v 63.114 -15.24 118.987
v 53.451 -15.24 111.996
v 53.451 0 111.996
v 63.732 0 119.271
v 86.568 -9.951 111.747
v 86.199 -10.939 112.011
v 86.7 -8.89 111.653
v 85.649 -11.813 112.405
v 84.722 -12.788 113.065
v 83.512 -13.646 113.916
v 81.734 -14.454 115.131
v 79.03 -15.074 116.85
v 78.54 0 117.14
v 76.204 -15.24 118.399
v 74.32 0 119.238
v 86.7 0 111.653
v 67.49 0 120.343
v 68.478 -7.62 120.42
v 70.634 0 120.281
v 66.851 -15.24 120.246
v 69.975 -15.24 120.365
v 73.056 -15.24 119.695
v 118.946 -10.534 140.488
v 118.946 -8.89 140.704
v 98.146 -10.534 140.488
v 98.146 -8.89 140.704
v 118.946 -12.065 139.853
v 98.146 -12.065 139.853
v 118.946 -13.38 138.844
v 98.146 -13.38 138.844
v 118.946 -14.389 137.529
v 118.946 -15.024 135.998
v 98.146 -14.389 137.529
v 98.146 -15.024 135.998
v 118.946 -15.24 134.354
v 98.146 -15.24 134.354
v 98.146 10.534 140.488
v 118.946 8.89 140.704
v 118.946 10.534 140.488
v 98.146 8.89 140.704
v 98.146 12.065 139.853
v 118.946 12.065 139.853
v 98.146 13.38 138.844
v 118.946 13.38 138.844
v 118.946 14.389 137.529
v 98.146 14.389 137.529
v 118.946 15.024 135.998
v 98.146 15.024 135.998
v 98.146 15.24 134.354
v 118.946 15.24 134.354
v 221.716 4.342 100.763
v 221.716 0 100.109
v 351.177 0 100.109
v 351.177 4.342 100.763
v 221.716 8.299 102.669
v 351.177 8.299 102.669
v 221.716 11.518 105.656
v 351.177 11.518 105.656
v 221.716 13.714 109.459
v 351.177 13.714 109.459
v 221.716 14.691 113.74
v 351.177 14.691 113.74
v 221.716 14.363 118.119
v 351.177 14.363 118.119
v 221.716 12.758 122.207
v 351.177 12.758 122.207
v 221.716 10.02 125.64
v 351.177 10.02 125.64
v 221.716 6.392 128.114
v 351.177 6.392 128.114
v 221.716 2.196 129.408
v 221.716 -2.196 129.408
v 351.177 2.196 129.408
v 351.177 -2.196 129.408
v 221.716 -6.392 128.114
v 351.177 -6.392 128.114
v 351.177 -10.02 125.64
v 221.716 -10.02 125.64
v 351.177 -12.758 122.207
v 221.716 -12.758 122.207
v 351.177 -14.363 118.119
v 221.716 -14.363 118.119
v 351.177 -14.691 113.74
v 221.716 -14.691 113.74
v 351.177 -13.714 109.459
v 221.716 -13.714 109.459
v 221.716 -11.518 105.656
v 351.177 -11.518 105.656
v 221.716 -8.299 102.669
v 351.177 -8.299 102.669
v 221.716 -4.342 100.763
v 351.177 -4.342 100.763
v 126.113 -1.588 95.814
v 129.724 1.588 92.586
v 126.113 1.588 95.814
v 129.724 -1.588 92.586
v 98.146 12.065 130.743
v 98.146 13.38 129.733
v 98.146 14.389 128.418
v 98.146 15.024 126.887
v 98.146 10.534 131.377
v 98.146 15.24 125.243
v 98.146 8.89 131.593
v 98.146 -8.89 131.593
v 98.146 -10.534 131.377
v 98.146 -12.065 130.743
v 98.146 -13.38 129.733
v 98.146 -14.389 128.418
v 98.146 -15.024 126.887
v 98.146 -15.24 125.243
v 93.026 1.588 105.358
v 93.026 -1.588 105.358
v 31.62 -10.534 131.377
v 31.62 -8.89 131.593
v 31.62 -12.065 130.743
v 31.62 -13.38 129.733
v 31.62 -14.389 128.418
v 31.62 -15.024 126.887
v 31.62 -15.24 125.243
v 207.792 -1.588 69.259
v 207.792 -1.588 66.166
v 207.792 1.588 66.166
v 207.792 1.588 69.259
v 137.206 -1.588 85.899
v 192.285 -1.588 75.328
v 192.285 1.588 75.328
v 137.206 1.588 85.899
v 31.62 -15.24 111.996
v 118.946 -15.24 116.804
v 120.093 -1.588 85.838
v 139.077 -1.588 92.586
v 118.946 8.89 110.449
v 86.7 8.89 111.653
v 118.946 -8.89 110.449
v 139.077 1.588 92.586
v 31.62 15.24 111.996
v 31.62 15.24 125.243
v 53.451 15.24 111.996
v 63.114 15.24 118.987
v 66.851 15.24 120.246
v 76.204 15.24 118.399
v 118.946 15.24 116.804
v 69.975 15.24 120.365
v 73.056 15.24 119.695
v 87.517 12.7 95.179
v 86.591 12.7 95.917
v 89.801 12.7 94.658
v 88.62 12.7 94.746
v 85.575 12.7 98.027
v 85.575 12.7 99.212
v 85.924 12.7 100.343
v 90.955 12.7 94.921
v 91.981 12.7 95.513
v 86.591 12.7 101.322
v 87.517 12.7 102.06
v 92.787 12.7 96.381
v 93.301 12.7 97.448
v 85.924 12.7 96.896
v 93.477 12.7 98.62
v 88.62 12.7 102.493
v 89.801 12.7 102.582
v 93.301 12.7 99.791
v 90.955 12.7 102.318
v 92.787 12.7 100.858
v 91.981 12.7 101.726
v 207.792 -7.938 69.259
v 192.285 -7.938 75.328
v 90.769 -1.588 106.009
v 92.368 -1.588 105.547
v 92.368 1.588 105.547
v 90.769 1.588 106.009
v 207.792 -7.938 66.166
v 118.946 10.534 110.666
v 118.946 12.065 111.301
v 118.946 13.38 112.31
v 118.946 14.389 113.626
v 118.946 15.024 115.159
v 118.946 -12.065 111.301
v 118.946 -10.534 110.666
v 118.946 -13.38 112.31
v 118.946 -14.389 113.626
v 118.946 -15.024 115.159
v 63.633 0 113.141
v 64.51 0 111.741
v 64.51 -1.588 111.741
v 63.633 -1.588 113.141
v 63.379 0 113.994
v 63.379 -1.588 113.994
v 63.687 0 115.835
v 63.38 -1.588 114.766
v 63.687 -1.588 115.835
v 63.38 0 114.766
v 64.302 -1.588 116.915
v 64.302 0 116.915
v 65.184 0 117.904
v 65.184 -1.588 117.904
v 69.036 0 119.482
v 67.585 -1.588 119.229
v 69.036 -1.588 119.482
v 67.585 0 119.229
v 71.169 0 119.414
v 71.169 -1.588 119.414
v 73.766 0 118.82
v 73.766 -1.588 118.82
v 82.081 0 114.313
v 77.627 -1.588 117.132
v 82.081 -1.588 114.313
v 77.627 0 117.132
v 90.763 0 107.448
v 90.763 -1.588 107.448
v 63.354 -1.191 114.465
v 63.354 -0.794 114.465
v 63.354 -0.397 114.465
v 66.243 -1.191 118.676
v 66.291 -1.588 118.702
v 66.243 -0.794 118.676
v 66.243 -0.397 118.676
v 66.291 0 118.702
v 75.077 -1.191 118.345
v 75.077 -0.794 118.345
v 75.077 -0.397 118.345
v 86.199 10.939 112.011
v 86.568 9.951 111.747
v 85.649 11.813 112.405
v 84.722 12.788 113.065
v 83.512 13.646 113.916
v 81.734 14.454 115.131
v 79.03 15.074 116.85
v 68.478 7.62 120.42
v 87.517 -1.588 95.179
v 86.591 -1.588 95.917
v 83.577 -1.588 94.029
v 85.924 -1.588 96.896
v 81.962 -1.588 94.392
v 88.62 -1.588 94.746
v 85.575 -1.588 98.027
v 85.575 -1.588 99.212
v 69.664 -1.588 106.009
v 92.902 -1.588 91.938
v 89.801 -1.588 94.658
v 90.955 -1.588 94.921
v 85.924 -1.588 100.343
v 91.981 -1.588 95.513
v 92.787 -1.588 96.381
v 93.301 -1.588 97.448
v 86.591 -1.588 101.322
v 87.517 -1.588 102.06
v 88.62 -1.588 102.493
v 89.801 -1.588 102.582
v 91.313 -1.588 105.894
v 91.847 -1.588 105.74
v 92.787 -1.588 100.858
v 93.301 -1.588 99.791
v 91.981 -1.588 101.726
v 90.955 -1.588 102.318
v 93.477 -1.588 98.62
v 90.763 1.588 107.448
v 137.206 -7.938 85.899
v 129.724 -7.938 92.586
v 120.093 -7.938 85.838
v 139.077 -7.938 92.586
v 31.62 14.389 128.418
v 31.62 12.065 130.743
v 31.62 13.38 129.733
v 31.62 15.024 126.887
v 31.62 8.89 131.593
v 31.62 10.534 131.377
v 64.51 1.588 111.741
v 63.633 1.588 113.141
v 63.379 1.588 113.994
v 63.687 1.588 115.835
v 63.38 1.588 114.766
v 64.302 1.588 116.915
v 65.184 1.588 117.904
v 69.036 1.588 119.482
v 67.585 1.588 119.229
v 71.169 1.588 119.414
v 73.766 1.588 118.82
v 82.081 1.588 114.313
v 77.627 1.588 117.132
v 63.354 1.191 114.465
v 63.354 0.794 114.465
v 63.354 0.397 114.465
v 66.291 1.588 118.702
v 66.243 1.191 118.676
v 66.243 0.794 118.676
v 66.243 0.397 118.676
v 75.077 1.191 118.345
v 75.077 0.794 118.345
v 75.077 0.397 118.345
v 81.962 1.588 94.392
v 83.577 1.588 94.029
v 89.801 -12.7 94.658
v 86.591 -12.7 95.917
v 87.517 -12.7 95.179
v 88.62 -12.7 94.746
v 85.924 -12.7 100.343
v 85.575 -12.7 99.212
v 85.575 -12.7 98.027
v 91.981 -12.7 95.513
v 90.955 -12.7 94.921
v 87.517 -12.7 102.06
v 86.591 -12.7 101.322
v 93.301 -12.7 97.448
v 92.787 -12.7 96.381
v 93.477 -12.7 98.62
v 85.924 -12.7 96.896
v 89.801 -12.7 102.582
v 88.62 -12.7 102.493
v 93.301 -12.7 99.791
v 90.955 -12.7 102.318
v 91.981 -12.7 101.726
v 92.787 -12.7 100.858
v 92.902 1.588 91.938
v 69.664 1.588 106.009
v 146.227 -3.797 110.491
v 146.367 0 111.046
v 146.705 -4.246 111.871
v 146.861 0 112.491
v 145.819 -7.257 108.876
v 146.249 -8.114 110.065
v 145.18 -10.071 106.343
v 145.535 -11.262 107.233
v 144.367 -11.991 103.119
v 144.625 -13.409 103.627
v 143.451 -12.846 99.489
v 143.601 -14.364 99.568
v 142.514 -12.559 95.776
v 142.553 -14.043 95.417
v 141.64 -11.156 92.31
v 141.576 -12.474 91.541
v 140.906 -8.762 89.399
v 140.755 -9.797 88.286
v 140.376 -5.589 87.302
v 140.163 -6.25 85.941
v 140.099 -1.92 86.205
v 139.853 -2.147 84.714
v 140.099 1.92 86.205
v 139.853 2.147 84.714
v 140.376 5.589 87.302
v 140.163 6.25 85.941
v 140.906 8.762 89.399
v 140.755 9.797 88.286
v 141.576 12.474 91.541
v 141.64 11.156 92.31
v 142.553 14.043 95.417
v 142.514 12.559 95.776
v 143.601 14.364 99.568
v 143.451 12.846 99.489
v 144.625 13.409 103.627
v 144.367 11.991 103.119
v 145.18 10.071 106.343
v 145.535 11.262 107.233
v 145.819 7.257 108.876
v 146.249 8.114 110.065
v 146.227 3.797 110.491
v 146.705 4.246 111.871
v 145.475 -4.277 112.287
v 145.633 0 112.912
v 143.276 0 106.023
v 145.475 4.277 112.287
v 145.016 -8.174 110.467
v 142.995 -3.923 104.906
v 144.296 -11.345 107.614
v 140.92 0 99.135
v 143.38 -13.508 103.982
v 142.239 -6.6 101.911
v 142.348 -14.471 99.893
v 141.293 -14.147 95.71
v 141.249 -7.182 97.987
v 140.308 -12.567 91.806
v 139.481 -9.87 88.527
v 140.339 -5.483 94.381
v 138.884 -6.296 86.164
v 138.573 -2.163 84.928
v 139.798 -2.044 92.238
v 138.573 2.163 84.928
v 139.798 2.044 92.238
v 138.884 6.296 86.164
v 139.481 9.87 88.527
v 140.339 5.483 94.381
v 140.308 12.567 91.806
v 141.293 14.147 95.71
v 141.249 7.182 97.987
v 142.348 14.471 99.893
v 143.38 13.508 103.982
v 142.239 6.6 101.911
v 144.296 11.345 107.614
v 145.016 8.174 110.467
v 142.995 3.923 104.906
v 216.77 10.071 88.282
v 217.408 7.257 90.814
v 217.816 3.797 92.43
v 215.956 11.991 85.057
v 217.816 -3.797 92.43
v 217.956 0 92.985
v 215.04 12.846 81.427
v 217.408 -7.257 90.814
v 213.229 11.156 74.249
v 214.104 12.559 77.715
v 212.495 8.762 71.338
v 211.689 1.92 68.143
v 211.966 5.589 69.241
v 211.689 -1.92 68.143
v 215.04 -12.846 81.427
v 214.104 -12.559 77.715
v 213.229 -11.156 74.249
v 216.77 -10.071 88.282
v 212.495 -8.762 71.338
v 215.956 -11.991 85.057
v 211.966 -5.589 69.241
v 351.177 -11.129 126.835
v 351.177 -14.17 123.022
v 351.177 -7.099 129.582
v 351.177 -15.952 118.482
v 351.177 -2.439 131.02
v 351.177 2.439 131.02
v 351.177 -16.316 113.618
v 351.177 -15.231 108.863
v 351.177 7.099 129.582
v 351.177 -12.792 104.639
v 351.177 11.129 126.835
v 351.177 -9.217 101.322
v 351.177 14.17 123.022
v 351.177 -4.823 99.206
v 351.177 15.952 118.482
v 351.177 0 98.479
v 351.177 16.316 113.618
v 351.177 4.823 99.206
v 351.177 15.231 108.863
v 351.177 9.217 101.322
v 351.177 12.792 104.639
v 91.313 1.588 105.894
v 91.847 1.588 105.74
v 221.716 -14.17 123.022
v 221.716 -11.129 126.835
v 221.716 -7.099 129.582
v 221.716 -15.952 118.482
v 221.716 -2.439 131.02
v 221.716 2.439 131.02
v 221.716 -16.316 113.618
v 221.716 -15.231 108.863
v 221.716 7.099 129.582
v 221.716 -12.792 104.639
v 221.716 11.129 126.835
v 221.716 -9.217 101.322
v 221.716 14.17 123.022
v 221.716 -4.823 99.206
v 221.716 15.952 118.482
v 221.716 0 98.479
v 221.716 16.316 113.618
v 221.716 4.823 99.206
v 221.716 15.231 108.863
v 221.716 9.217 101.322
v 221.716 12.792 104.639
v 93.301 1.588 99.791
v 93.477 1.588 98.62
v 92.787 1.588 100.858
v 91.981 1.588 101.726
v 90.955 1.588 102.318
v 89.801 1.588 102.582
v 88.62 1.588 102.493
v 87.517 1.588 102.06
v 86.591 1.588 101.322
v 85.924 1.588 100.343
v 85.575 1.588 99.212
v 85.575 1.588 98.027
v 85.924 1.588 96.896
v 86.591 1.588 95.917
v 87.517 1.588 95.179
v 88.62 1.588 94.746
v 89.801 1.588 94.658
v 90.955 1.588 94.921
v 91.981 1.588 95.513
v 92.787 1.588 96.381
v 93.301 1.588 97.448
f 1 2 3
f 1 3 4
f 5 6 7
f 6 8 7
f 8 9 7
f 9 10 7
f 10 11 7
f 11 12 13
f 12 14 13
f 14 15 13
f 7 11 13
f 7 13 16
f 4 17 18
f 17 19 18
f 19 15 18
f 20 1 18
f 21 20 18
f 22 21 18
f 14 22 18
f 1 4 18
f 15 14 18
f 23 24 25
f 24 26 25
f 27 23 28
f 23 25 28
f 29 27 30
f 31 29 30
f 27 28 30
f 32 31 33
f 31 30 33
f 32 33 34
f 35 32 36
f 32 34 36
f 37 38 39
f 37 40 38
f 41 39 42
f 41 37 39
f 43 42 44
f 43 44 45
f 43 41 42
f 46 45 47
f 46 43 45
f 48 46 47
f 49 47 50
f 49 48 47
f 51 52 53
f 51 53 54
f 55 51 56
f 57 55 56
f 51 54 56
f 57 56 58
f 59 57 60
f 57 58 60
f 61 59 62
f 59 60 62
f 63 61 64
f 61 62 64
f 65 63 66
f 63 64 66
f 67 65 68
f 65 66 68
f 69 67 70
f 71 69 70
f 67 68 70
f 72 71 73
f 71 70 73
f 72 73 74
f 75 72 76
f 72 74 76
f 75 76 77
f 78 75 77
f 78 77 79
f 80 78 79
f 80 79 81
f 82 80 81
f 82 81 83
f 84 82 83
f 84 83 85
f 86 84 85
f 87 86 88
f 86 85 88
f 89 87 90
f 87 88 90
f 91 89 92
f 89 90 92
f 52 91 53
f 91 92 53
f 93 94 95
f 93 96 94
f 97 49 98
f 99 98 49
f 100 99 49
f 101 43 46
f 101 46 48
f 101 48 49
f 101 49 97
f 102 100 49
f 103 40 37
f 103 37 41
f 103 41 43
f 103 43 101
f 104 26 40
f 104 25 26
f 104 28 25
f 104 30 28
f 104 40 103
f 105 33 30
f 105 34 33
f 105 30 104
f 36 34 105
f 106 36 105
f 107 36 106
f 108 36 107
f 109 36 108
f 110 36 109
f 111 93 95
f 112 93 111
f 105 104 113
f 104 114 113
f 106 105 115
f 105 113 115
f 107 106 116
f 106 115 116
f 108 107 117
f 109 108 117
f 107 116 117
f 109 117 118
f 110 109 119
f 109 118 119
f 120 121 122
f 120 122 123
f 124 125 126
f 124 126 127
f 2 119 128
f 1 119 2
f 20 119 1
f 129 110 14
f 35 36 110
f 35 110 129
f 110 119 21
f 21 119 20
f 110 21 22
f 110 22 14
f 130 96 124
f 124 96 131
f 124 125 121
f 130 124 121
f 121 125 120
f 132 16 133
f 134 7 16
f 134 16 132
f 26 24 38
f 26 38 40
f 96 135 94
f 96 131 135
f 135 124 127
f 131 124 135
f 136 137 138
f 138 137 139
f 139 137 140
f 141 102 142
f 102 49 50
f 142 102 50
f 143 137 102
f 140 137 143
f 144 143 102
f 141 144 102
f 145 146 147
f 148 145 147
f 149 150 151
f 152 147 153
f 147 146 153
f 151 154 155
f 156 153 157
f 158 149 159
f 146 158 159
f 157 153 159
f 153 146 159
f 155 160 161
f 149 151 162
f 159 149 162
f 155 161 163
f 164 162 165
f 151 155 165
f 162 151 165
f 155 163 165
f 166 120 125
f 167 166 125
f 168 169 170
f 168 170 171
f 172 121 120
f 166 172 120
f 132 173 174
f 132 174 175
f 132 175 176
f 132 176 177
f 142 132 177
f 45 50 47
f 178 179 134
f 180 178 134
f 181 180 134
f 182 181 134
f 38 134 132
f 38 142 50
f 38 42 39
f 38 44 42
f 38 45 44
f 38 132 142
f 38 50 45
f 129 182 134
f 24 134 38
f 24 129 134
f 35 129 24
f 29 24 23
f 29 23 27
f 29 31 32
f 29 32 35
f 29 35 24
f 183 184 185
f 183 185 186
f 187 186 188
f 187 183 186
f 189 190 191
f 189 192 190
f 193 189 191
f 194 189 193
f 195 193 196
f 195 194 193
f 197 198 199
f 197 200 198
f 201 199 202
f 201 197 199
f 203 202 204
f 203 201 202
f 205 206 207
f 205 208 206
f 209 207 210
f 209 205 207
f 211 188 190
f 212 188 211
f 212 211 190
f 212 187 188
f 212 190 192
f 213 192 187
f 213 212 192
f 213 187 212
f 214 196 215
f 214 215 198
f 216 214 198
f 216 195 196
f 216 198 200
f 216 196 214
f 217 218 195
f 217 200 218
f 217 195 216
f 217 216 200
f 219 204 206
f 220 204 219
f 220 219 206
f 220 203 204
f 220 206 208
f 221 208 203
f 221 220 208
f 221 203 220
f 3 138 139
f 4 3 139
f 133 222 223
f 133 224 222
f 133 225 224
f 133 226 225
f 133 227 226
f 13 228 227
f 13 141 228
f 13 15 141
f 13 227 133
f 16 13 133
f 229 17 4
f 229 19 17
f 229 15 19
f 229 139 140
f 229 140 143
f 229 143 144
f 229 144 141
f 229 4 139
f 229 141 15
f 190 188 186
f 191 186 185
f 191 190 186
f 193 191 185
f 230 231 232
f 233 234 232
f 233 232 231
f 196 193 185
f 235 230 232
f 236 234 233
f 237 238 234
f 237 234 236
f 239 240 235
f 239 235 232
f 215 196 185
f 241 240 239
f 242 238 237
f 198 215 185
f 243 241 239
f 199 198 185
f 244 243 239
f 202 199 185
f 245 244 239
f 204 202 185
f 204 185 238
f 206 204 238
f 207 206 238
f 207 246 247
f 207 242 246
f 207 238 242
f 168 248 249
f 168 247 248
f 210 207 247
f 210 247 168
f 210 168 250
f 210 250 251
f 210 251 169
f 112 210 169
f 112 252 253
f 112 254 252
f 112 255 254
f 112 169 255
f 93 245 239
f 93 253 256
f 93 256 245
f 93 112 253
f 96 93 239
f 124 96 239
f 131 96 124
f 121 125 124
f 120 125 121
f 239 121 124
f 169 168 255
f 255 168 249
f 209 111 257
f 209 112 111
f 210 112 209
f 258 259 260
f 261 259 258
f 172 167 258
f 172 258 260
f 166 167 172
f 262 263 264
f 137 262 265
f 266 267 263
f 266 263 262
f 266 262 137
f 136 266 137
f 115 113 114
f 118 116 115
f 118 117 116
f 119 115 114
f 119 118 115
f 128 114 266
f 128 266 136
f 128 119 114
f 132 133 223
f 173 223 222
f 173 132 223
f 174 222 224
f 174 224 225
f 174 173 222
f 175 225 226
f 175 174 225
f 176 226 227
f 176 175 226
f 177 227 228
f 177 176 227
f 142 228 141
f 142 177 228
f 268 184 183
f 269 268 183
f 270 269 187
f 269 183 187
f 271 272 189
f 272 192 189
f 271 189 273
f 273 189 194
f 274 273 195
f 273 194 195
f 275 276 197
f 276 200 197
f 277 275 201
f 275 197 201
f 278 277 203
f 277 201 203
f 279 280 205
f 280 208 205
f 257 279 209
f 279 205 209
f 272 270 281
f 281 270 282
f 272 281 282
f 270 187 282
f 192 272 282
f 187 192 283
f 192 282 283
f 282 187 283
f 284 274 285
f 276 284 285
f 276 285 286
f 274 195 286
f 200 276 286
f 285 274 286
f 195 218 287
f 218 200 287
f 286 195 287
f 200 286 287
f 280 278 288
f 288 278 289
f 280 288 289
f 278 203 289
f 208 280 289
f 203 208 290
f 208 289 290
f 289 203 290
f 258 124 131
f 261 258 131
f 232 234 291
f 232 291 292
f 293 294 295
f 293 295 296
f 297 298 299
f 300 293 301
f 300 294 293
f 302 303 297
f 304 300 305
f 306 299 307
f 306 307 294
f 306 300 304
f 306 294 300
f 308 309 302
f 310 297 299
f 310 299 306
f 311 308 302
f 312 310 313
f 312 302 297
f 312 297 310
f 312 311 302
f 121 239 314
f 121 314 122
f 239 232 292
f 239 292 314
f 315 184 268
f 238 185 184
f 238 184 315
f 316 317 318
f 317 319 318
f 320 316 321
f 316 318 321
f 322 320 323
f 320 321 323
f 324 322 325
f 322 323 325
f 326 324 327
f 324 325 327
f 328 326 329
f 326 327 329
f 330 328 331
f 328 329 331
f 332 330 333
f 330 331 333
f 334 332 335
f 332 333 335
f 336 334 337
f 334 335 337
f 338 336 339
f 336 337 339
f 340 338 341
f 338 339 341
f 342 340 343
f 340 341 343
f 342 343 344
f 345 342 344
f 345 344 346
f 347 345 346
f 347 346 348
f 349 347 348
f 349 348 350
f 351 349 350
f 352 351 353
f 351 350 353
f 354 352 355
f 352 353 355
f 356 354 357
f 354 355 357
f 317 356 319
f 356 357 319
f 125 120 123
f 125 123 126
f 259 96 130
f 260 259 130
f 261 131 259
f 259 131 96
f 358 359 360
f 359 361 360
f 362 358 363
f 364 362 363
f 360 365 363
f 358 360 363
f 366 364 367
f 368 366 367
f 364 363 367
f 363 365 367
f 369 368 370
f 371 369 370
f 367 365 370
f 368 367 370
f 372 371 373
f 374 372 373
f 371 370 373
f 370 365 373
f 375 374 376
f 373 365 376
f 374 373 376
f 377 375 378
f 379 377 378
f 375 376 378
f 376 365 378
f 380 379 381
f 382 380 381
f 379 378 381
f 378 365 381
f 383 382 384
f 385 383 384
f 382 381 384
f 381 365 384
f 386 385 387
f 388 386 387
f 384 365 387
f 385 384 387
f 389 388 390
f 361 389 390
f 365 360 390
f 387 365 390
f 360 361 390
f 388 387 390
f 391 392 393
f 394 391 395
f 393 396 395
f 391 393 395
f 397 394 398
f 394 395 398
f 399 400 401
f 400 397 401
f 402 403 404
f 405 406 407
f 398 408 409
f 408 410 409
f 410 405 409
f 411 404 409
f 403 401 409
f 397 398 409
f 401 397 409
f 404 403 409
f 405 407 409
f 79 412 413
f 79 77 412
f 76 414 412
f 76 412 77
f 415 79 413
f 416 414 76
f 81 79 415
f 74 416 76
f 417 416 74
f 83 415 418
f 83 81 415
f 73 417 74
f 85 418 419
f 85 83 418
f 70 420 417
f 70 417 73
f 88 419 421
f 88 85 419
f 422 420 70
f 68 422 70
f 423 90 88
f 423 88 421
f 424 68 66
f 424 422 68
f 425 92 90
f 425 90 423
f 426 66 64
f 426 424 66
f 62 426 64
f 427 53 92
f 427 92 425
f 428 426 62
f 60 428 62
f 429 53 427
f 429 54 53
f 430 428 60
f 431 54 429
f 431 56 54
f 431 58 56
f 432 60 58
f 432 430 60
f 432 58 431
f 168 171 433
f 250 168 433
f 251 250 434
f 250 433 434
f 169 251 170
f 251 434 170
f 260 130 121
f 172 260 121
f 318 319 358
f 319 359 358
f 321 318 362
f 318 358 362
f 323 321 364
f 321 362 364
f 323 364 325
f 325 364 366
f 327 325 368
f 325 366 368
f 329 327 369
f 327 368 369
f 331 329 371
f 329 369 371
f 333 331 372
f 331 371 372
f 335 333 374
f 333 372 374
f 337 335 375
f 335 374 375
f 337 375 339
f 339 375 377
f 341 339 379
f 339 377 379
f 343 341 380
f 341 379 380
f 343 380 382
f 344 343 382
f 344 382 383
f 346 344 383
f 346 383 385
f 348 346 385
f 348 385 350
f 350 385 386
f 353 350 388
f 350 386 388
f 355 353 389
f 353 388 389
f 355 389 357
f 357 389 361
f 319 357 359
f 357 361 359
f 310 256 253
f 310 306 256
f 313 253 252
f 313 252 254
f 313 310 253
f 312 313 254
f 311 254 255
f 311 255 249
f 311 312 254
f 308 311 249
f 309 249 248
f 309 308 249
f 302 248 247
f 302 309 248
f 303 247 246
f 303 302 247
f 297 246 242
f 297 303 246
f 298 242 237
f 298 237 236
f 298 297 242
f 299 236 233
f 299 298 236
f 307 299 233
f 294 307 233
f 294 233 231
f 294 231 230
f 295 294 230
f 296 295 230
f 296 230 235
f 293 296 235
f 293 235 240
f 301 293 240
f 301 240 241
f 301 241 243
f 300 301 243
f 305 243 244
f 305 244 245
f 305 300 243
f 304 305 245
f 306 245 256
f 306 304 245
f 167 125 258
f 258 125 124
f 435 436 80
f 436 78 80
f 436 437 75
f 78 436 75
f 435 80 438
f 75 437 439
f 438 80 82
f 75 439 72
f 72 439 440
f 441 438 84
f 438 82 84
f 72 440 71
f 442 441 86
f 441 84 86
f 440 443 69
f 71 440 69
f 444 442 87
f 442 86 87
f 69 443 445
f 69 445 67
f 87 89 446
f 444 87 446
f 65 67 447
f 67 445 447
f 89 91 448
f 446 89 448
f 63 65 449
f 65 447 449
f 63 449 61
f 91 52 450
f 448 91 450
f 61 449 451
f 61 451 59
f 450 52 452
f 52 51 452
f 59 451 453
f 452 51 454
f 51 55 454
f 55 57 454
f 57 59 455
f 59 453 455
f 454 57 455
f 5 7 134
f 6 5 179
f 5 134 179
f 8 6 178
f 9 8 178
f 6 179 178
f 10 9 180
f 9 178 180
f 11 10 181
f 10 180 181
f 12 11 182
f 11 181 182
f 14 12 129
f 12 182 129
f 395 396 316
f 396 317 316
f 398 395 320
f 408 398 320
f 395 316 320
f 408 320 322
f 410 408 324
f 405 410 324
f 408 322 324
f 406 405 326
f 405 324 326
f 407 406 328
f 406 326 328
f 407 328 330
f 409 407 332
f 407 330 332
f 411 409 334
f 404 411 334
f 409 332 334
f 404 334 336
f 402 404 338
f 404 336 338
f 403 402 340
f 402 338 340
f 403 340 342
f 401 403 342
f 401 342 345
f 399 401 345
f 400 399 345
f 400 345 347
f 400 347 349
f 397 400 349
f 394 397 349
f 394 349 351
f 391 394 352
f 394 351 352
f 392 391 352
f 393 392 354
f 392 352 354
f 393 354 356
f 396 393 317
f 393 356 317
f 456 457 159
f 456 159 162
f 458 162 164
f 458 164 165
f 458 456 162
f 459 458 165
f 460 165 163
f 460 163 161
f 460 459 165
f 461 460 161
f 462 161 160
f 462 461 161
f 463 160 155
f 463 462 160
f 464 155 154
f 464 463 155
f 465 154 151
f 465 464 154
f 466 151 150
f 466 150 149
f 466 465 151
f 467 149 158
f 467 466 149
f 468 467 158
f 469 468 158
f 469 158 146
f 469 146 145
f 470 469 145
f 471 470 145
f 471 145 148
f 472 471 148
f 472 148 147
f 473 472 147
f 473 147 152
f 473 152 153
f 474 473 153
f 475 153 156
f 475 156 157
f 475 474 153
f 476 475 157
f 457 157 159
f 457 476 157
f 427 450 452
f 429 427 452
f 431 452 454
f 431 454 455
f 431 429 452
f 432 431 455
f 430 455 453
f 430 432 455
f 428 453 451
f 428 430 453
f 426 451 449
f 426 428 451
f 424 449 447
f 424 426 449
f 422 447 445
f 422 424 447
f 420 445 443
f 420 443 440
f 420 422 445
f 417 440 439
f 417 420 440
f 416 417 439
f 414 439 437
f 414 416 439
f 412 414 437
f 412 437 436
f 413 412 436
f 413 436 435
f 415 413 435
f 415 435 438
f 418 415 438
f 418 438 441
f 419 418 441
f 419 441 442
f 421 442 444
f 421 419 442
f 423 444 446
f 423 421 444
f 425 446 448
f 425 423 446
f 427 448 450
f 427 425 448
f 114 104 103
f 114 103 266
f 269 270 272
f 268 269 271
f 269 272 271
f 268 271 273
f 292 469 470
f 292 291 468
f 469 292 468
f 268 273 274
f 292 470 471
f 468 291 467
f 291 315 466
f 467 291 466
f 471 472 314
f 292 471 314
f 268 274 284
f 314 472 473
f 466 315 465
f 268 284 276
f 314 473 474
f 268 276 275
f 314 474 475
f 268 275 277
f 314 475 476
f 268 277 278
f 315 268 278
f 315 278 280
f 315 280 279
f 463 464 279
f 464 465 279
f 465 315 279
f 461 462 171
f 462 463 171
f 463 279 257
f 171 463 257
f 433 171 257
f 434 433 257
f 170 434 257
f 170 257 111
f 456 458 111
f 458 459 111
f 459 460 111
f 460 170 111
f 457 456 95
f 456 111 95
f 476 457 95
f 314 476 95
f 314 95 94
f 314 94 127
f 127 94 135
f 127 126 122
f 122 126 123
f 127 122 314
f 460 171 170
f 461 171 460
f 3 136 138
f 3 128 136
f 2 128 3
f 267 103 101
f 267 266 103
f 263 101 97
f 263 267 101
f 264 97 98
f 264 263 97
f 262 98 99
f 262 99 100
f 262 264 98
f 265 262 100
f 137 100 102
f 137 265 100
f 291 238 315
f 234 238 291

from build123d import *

# Parameters (mm, degrees)
F1_DEPTH = 15.24
F0_R     = 3.9731060398
F0_R_2   = 3.0736063734
F2_DEPTH = 1.5875
F3_DEPTH = 12.7
F4_DEPTH = 1.5875
F5_R     = 6.35
F7_DEPTH = 6.35
F0_W     = 129.4614523649
F0_H     = 1.6299113631


with BuildPart() as f1:
    # F0 (on Front) → F1 (new body, symmetric)
    with BuildSketch(Plane.XZ):
        with BuildLine():
            Line((86.6997018456, 111.6525381804), (118.946261704, 110.4492247105))
            Line((118.946261704, 110.4492247105), (118.946261704, 140.7041400671))
            Line((118.946261704, 140.7041400671), (98.146006465, 140.7041400671))
            Line((98.146006465, 140.7041400671), (98.146006465, 131.5932869911))
            Line((98.146006465, 131.5932869911), (61.9845092297, 131.5932869911))
            Line((61.9845092297, 131.5932869911), (31.6195674241, 131.5932869911))
            Line((31.6195674241, 131.5932869911), (31.6195674241, 111.996345222))
            Line((31.6195674241, 111.996345222), (53.4512475133, 111.996345222))
            add(Edge.make_bspline(
                [(53.4512475133, 111.996345222), (58.3168306673, 116.1252412176), (68.453958846, 124.7275292928), (80.4575514371, 116.1256945279), (86.6997018456, 111.6525381804)],
                knots=[0, 0, 0, 0, 0.4799764853, 1, 1, 1, 1], degree=3))
        make_face()
    extrude(amount=F1_DEPTH, both=True)

    # F5
    f5_edges = [f1.edges().sort_by_distance(p)[0] for p in [
        (108.546134, -15.24, 140.70414),
        (108.546134, 15.24, 140.70414),
        (64.882787, -15.24, 131.593287),
        (64.882787, 15.24, 131.593287),
        (102.822982, -15.24, 111.050881),
        (102.822982, 15.24, 111.050881),
    ]]
    fillet(f5_edges, radius=F5_R)


with BuildPart() as f2:
    # F0 (on Front) → F2 (new body, symmetric)
    with BuildSketch(Plane.XZ):
        with BuildLine():
            Line((93.0258051353, 105.357555367), (92.3684626431, 105.5471538964))
            ThreePointArc((92.3684626431, 105.5471538964), (96.9946369471, 98.9133964686), (92.9022758123, 91.9376666398))
            Line((92.9022758123, 91.9376666398), (207.791640524, 66.1663692981))
            Line((207.791640524, 66.1663692981), (207.791640524, 69.2587812037))
            Line((207.791640524, 69.2587812037), (192.2845032771, 75.3275844649))
            Line((192.2845032771, 75.3275844649), (137.2056572242, 85.8992456725))
            Line((137.2056572242, 85.8992456725), (139.0773238139, 92.5864348974))
            Line((139.0773238139, 92.5864348974), (129.7239542488, 92.5864348974))
            Line((129.7239542488, 92.5864348974), (126.1126250029, 95.8142617838))
            Line((126.1126250029, 95.8142617838), (93.0258051353, 105.357555367))
        make_face()
        with BuildLine():
            Line((92.3684626431, 105.5471538964), (90.7687973852, 106.0085483505))
            ThreePointArc((90.7687973852, 106.0085483505), (89.5039578812, 106.116024046), (88.2391183773, 106.0085483505))
            ThreePointArc((88.2391183773, 106.0085483505), (82.5179147523, 101.3383714123), (83.5771539377, 94.0294223839))
            Line((83.5771539377, 94.0294223839), (92.9022758123, 91.9376666398))
            ThreePointArc((92.9022758123, 91.9376666398), (96.9946369471, 98.9133964686), (92.3684626431, 105.5471538964))
        make_face()
        with Locations((89.5039578812, 98.6195850225)):
            Circle(F0_R, mode=Mode.SUBTRACT)
        with BuildLine():
            ThreePointArc((83.5771539377, 94.0294223839), (82.5179147523, 101.3383714123), (88.2391183773, 106.0085483505))
            Line((88.2391183773, 106.0085483505), (69.6638524261, 106.0085483505))
            Line((69.6638524261, 106.0085483505), (81.9616011421, 94.3918135554))
            Line((81.9616011421, 94.3918135554), (83.5771539377, 94.0294223839))
        make_face()
        with BuildLine():
            ThreePointArc((88.2391183773, 106.0085483505), (89.5039578812, 106.116024046), (90.7687973852, 106.0085483505))
            ThreePointArc((90.7687973852, 106.0085483505), (91.5814785736, 105.8223973764), (92.3684626431, 105.5471538964))
            Line((92.3684626431, 105.5471538964), (93.0258051353, 105.357555367))
            Line((93.0258051353, 105.357555367), (90.7626391127, 107.4478176521))
            add(Edge.make_bspline(
                [(64.5098686218, 111.7411181331), (63.9137016058, 112.5668330608), (62.5343781835, 114.4772433317), (66.0422163293, 120.1249758602), (76.4095139275, 119.3635573559), (85.4079513498, 111.8933308188), (90.7626391127, 107.4478176521)],
                knots=[0, 0, 0, 0, 0.1519197497, 0.3514801969, 0.6140421636, 1, 1, 1, 1], degree=3))
            Line((64.5098686218, 111.7411181331), (69.6638524261, 106.0085483505))
            Line((69.6638524261, 106.0085483505), (88.2391183773, 106.0085483505))
        make_face()
        with Locations((69.2448988557, 115.1391863823)):
            Circle(F0_R_2, mode=Mode.SUBTRACT)
    extrude(amount=F2_DEPTH, both=True)

    # F0 (on Front) → F3 (join, symmetric)
    with BuildSketch(Plane.XZ):
        with Locations((89.5039578812, 98.6195850225)):
            Circle(F0_R)
    extrude(amount=F3_DEPTH, both=True)

    # F0 (on Front) → F4 (join, symmetric)
    with BuildSketch(Plane.XZ):
        with Locations((69.2448988557, 115.1391863823)):
            Circle(F0_R_2)
    extrude(amount=F4_DEPTH, both=True)


with BuildPart() as f7:
    # F6 (on face) → F7 (new body)
    with BuildSketch(Plane.XZ.offset(1.5875)):
        Polygon((139.0773238139, 92.5864348974), (129.7239542488, 92.5864348974), (120.093039846, 85.8383965584), (207.791640524, 66.1663692981), (207.791640524, 69.2587812037), (192.2845032771, 75.3275844649), (137.2056572242, 85.8992456725), align=None)
    extrude(amount=F7_DEPTH)


with BuildPart() as f8:
    # F0 (on Front) → F8 (revolve)
    with BuildSketch(Plane.XZ):
        Polygon((145.6326246262, 112.9116564989), (140.9199244391, 99.1347101404), (214.8047371471, 80.4940435456), (217.9560074791, 92.9845313235), (146.3668381612, 111.0460217455), (146.8612531956, 112.4913777275), align=None)
    revolve(axis=Axis((177.8623307931, 0, 89.814376843), (0.9696169647, 0, -0.2446281705)))


with BuildPart() as f9:
    # F0 (on Front) → F9 (revolve)
    with BuildSketch(Plane.XZ):
        with Locations((286.4464297891, 99.2938540876)):
            Rectangle(F0_W, F0_H)
    revolve(axis=Axis((229.2831465602, 0, 114.8408097692), (1, 0, 0)))


solid = Compound([f1.part, f2.part, f7.part, f8.part, f9.part])
